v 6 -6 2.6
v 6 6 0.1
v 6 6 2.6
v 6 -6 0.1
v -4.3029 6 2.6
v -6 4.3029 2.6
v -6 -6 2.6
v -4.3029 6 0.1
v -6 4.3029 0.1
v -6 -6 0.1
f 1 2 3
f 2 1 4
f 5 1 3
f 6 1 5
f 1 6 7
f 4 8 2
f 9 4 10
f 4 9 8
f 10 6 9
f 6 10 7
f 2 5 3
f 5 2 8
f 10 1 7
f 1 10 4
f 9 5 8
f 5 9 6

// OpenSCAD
// Seeed Wio-E5 / LoRa-E5 module: 12 x 12 x 2.5 mm shielded can.
//
// Perimeter only - the castellated pads, the shield seam and the label are
// not modelled. Authored in KiCad 3D model space: X matches the footprint's
// X, Y is the footprint's Y negated, Z is height above the board.

$fn = 32;

BODY = 12.0;
HEIGHT = 2.5;
STANDOFF = 0.1;   // solder paste under the castellations
CHAMFER = 1.2;    // pin 1 corner, footprint (-x, -y) = model (-x, +y)

module can() {
    difference() {
        translate([-BODY / 2, -BODY / 2, STANDOFF])
            cube([BODY, BODY, HEIGHT]);
        // pin 1 corner chamfer
        translate([-BODY / 2, BODY / 2, STANDOFF - 0.1])
            rotate([0, 0, 45])
                translate([-CHAMFER, -CHAMFER, 0])
                    cube([CHAMFER * 2, CHAMFER * 2, HEIGHT + 0.2]);
    }
}

can();
